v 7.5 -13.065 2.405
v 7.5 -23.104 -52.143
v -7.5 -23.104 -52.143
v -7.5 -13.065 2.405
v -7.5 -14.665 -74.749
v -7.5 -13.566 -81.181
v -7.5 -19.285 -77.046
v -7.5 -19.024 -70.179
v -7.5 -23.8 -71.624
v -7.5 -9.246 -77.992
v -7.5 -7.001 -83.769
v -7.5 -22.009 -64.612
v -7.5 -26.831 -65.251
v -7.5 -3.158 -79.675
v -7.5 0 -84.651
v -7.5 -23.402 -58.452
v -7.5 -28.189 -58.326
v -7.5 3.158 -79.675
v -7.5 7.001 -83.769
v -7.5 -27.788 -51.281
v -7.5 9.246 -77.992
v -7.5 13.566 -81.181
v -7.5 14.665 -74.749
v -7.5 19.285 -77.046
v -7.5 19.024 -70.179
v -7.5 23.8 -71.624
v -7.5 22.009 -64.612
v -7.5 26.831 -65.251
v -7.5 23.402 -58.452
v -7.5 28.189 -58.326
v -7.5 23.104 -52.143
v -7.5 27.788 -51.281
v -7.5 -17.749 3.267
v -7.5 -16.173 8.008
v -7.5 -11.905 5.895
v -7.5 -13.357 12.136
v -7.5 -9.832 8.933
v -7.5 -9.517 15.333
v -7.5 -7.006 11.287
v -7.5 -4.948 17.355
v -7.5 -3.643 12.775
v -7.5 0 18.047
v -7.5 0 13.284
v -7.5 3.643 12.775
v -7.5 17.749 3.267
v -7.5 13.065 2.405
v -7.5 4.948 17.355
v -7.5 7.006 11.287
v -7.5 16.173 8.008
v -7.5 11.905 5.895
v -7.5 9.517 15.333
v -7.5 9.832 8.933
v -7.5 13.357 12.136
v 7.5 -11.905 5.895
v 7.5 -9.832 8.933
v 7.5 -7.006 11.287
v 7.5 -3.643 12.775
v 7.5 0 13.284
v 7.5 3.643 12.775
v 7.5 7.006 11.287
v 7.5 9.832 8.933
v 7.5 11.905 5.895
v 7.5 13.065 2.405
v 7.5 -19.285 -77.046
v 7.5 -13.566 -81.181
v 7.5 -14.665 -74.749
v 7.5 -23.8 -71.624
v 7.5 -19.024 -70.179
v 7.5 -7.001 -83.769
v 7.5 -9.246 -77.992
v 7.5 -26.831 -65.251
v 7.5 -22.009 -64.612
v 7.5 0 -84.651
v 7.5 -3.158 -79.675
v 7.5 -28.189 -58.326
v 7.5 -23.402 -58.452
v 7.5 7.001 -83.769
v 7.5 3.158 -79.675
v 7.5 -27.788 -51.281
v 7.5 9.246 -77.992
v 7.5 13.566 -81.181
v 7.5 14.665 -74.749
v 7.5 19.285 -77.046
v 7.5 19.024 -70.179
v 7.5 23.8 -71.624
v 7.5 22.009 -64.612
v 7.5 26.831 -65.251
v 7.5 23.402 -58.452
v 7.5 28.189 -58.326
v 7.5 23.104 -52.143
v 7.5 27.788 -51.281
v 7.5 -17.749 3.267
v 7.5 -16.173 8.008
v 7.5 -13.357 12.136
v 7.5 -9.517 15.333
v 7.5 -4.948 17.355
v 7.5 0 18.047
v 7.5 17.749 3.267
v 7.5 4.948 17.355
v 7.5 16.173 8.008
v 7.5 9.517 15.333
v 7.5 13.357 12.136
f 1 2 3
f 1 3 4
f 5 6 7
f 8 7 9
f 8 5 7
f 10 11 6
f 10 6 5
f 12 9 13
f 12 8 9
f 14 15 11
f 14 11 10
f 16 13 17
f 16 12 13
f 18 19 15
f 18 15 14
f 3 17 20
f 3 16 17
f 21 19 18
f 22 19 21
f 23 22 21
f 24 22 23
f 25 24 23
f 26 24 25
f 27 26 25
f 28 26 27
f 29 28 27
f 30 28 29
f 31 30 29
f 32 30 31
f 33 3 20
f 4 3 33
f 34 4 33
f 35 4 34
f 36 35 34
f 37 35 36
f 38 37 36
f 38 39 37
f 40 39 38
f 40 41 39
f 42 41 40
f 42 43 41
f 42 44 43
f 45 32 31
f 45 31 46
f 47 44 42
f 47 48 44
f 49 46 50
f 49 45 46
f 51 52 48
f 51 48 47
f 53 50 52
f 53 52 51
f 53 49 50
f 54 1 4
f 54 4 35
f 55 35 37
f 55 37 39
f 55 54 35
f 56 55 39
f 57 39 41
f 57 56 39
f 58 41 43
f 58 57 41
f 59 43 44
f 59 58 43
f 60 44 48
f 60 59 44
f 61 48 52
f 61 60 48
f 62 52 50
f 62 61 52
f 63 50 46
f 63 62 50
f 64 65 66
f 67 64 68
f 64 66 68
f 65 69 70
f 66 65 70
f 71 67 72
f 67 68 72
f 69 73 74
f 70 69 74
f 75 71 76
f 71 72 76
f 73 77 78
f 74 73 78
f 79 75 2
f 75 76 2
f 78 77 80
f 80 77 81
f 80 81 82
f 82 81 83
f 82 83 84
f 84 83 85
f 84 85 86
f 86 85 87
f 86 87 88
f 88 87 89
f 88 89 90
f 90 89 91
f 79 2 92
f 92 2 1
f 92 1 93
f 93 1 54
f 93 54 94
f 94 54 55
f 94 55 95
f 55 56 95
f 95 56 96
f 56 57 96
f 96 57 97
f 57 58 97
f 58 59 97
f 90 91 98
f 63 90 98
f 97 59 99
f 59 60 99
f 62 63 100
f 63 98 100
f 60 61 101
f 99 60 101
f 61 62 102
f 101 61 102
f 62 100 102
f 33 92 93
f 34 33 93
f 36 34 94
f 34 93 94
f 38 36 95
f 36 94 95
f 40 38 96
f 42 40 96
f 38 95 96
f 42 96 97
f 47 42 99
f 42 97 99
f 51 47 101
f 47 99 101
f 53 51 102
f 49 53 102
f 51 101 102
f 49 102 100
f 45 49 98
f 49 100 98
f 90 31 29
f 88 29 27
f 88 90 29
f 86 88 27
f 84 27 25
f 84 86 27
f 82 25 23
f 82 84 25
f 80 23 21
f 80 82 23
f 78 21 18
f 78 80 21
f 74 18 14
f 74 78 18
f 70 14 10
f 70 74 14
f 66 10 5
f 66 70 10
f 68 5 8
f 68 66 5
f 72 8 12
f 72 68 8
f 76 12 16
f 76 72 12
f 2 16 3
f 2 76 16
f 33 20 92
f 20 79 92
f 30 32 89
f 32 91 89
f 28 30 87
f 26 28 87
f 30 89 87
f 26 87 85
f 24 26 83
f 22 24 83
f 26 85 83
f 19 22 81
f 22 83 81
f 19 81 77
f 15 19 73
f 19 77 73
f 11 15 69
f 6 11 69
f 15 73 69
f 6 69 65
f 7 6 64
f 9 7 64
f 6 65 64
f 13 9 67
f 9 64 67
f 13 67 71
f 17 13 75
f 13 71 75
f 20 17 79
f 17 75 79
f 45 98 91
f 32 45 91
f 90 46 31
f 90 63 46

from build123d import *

# Parameters (mm, degrees)
BOSS_EXTRUDE1_DEPTH = 7.5


with BuildPart() as part:
    # Sketch1 → Boss-Extrude1 (new body, symmetric)
    with BuildSketch(Plane(origin=(0, 0, 0), x_dir=(0, 0, -1), z_dir=(1, 0, 0))):
        with BuildLine():
            Line((-3.266661591, 17.748585942), (51.281145188, 27.788215344))
            ThreePointArc((51.281145188, 27.788215344), (84.65058, 0), (51.281145188, -27.788215344))
            Line((51.281145188, -27.788215344), (-3.266661591, -17.748585942))
            ThreePointArc((-3.266661591, -17.748585942), (-18.0467, 0), (-3.266661591, 17.748585942))
        make_face()
        with BuildLine():
            Line((-2.404593965, 13.064757843), (52.143212814, 23.104387245))
            ThreePointArc((52.143212814, 23.104387245), (79.88808, 0), (52.143212814, -23.104387245))
            Line((52.143212814, -23.104387245), (-2.404593965, -13.064757843))
            ThreePointArc((-2.404593965, -13.064757843), (-13.2842, 0), (-2.404593965, 13.064757843))
        make_face(mode=Mode.SUBTRACT)
    extrude(amount=BOSS_EXTRUDE1_DEPTH, both=True)


solid = part.part
